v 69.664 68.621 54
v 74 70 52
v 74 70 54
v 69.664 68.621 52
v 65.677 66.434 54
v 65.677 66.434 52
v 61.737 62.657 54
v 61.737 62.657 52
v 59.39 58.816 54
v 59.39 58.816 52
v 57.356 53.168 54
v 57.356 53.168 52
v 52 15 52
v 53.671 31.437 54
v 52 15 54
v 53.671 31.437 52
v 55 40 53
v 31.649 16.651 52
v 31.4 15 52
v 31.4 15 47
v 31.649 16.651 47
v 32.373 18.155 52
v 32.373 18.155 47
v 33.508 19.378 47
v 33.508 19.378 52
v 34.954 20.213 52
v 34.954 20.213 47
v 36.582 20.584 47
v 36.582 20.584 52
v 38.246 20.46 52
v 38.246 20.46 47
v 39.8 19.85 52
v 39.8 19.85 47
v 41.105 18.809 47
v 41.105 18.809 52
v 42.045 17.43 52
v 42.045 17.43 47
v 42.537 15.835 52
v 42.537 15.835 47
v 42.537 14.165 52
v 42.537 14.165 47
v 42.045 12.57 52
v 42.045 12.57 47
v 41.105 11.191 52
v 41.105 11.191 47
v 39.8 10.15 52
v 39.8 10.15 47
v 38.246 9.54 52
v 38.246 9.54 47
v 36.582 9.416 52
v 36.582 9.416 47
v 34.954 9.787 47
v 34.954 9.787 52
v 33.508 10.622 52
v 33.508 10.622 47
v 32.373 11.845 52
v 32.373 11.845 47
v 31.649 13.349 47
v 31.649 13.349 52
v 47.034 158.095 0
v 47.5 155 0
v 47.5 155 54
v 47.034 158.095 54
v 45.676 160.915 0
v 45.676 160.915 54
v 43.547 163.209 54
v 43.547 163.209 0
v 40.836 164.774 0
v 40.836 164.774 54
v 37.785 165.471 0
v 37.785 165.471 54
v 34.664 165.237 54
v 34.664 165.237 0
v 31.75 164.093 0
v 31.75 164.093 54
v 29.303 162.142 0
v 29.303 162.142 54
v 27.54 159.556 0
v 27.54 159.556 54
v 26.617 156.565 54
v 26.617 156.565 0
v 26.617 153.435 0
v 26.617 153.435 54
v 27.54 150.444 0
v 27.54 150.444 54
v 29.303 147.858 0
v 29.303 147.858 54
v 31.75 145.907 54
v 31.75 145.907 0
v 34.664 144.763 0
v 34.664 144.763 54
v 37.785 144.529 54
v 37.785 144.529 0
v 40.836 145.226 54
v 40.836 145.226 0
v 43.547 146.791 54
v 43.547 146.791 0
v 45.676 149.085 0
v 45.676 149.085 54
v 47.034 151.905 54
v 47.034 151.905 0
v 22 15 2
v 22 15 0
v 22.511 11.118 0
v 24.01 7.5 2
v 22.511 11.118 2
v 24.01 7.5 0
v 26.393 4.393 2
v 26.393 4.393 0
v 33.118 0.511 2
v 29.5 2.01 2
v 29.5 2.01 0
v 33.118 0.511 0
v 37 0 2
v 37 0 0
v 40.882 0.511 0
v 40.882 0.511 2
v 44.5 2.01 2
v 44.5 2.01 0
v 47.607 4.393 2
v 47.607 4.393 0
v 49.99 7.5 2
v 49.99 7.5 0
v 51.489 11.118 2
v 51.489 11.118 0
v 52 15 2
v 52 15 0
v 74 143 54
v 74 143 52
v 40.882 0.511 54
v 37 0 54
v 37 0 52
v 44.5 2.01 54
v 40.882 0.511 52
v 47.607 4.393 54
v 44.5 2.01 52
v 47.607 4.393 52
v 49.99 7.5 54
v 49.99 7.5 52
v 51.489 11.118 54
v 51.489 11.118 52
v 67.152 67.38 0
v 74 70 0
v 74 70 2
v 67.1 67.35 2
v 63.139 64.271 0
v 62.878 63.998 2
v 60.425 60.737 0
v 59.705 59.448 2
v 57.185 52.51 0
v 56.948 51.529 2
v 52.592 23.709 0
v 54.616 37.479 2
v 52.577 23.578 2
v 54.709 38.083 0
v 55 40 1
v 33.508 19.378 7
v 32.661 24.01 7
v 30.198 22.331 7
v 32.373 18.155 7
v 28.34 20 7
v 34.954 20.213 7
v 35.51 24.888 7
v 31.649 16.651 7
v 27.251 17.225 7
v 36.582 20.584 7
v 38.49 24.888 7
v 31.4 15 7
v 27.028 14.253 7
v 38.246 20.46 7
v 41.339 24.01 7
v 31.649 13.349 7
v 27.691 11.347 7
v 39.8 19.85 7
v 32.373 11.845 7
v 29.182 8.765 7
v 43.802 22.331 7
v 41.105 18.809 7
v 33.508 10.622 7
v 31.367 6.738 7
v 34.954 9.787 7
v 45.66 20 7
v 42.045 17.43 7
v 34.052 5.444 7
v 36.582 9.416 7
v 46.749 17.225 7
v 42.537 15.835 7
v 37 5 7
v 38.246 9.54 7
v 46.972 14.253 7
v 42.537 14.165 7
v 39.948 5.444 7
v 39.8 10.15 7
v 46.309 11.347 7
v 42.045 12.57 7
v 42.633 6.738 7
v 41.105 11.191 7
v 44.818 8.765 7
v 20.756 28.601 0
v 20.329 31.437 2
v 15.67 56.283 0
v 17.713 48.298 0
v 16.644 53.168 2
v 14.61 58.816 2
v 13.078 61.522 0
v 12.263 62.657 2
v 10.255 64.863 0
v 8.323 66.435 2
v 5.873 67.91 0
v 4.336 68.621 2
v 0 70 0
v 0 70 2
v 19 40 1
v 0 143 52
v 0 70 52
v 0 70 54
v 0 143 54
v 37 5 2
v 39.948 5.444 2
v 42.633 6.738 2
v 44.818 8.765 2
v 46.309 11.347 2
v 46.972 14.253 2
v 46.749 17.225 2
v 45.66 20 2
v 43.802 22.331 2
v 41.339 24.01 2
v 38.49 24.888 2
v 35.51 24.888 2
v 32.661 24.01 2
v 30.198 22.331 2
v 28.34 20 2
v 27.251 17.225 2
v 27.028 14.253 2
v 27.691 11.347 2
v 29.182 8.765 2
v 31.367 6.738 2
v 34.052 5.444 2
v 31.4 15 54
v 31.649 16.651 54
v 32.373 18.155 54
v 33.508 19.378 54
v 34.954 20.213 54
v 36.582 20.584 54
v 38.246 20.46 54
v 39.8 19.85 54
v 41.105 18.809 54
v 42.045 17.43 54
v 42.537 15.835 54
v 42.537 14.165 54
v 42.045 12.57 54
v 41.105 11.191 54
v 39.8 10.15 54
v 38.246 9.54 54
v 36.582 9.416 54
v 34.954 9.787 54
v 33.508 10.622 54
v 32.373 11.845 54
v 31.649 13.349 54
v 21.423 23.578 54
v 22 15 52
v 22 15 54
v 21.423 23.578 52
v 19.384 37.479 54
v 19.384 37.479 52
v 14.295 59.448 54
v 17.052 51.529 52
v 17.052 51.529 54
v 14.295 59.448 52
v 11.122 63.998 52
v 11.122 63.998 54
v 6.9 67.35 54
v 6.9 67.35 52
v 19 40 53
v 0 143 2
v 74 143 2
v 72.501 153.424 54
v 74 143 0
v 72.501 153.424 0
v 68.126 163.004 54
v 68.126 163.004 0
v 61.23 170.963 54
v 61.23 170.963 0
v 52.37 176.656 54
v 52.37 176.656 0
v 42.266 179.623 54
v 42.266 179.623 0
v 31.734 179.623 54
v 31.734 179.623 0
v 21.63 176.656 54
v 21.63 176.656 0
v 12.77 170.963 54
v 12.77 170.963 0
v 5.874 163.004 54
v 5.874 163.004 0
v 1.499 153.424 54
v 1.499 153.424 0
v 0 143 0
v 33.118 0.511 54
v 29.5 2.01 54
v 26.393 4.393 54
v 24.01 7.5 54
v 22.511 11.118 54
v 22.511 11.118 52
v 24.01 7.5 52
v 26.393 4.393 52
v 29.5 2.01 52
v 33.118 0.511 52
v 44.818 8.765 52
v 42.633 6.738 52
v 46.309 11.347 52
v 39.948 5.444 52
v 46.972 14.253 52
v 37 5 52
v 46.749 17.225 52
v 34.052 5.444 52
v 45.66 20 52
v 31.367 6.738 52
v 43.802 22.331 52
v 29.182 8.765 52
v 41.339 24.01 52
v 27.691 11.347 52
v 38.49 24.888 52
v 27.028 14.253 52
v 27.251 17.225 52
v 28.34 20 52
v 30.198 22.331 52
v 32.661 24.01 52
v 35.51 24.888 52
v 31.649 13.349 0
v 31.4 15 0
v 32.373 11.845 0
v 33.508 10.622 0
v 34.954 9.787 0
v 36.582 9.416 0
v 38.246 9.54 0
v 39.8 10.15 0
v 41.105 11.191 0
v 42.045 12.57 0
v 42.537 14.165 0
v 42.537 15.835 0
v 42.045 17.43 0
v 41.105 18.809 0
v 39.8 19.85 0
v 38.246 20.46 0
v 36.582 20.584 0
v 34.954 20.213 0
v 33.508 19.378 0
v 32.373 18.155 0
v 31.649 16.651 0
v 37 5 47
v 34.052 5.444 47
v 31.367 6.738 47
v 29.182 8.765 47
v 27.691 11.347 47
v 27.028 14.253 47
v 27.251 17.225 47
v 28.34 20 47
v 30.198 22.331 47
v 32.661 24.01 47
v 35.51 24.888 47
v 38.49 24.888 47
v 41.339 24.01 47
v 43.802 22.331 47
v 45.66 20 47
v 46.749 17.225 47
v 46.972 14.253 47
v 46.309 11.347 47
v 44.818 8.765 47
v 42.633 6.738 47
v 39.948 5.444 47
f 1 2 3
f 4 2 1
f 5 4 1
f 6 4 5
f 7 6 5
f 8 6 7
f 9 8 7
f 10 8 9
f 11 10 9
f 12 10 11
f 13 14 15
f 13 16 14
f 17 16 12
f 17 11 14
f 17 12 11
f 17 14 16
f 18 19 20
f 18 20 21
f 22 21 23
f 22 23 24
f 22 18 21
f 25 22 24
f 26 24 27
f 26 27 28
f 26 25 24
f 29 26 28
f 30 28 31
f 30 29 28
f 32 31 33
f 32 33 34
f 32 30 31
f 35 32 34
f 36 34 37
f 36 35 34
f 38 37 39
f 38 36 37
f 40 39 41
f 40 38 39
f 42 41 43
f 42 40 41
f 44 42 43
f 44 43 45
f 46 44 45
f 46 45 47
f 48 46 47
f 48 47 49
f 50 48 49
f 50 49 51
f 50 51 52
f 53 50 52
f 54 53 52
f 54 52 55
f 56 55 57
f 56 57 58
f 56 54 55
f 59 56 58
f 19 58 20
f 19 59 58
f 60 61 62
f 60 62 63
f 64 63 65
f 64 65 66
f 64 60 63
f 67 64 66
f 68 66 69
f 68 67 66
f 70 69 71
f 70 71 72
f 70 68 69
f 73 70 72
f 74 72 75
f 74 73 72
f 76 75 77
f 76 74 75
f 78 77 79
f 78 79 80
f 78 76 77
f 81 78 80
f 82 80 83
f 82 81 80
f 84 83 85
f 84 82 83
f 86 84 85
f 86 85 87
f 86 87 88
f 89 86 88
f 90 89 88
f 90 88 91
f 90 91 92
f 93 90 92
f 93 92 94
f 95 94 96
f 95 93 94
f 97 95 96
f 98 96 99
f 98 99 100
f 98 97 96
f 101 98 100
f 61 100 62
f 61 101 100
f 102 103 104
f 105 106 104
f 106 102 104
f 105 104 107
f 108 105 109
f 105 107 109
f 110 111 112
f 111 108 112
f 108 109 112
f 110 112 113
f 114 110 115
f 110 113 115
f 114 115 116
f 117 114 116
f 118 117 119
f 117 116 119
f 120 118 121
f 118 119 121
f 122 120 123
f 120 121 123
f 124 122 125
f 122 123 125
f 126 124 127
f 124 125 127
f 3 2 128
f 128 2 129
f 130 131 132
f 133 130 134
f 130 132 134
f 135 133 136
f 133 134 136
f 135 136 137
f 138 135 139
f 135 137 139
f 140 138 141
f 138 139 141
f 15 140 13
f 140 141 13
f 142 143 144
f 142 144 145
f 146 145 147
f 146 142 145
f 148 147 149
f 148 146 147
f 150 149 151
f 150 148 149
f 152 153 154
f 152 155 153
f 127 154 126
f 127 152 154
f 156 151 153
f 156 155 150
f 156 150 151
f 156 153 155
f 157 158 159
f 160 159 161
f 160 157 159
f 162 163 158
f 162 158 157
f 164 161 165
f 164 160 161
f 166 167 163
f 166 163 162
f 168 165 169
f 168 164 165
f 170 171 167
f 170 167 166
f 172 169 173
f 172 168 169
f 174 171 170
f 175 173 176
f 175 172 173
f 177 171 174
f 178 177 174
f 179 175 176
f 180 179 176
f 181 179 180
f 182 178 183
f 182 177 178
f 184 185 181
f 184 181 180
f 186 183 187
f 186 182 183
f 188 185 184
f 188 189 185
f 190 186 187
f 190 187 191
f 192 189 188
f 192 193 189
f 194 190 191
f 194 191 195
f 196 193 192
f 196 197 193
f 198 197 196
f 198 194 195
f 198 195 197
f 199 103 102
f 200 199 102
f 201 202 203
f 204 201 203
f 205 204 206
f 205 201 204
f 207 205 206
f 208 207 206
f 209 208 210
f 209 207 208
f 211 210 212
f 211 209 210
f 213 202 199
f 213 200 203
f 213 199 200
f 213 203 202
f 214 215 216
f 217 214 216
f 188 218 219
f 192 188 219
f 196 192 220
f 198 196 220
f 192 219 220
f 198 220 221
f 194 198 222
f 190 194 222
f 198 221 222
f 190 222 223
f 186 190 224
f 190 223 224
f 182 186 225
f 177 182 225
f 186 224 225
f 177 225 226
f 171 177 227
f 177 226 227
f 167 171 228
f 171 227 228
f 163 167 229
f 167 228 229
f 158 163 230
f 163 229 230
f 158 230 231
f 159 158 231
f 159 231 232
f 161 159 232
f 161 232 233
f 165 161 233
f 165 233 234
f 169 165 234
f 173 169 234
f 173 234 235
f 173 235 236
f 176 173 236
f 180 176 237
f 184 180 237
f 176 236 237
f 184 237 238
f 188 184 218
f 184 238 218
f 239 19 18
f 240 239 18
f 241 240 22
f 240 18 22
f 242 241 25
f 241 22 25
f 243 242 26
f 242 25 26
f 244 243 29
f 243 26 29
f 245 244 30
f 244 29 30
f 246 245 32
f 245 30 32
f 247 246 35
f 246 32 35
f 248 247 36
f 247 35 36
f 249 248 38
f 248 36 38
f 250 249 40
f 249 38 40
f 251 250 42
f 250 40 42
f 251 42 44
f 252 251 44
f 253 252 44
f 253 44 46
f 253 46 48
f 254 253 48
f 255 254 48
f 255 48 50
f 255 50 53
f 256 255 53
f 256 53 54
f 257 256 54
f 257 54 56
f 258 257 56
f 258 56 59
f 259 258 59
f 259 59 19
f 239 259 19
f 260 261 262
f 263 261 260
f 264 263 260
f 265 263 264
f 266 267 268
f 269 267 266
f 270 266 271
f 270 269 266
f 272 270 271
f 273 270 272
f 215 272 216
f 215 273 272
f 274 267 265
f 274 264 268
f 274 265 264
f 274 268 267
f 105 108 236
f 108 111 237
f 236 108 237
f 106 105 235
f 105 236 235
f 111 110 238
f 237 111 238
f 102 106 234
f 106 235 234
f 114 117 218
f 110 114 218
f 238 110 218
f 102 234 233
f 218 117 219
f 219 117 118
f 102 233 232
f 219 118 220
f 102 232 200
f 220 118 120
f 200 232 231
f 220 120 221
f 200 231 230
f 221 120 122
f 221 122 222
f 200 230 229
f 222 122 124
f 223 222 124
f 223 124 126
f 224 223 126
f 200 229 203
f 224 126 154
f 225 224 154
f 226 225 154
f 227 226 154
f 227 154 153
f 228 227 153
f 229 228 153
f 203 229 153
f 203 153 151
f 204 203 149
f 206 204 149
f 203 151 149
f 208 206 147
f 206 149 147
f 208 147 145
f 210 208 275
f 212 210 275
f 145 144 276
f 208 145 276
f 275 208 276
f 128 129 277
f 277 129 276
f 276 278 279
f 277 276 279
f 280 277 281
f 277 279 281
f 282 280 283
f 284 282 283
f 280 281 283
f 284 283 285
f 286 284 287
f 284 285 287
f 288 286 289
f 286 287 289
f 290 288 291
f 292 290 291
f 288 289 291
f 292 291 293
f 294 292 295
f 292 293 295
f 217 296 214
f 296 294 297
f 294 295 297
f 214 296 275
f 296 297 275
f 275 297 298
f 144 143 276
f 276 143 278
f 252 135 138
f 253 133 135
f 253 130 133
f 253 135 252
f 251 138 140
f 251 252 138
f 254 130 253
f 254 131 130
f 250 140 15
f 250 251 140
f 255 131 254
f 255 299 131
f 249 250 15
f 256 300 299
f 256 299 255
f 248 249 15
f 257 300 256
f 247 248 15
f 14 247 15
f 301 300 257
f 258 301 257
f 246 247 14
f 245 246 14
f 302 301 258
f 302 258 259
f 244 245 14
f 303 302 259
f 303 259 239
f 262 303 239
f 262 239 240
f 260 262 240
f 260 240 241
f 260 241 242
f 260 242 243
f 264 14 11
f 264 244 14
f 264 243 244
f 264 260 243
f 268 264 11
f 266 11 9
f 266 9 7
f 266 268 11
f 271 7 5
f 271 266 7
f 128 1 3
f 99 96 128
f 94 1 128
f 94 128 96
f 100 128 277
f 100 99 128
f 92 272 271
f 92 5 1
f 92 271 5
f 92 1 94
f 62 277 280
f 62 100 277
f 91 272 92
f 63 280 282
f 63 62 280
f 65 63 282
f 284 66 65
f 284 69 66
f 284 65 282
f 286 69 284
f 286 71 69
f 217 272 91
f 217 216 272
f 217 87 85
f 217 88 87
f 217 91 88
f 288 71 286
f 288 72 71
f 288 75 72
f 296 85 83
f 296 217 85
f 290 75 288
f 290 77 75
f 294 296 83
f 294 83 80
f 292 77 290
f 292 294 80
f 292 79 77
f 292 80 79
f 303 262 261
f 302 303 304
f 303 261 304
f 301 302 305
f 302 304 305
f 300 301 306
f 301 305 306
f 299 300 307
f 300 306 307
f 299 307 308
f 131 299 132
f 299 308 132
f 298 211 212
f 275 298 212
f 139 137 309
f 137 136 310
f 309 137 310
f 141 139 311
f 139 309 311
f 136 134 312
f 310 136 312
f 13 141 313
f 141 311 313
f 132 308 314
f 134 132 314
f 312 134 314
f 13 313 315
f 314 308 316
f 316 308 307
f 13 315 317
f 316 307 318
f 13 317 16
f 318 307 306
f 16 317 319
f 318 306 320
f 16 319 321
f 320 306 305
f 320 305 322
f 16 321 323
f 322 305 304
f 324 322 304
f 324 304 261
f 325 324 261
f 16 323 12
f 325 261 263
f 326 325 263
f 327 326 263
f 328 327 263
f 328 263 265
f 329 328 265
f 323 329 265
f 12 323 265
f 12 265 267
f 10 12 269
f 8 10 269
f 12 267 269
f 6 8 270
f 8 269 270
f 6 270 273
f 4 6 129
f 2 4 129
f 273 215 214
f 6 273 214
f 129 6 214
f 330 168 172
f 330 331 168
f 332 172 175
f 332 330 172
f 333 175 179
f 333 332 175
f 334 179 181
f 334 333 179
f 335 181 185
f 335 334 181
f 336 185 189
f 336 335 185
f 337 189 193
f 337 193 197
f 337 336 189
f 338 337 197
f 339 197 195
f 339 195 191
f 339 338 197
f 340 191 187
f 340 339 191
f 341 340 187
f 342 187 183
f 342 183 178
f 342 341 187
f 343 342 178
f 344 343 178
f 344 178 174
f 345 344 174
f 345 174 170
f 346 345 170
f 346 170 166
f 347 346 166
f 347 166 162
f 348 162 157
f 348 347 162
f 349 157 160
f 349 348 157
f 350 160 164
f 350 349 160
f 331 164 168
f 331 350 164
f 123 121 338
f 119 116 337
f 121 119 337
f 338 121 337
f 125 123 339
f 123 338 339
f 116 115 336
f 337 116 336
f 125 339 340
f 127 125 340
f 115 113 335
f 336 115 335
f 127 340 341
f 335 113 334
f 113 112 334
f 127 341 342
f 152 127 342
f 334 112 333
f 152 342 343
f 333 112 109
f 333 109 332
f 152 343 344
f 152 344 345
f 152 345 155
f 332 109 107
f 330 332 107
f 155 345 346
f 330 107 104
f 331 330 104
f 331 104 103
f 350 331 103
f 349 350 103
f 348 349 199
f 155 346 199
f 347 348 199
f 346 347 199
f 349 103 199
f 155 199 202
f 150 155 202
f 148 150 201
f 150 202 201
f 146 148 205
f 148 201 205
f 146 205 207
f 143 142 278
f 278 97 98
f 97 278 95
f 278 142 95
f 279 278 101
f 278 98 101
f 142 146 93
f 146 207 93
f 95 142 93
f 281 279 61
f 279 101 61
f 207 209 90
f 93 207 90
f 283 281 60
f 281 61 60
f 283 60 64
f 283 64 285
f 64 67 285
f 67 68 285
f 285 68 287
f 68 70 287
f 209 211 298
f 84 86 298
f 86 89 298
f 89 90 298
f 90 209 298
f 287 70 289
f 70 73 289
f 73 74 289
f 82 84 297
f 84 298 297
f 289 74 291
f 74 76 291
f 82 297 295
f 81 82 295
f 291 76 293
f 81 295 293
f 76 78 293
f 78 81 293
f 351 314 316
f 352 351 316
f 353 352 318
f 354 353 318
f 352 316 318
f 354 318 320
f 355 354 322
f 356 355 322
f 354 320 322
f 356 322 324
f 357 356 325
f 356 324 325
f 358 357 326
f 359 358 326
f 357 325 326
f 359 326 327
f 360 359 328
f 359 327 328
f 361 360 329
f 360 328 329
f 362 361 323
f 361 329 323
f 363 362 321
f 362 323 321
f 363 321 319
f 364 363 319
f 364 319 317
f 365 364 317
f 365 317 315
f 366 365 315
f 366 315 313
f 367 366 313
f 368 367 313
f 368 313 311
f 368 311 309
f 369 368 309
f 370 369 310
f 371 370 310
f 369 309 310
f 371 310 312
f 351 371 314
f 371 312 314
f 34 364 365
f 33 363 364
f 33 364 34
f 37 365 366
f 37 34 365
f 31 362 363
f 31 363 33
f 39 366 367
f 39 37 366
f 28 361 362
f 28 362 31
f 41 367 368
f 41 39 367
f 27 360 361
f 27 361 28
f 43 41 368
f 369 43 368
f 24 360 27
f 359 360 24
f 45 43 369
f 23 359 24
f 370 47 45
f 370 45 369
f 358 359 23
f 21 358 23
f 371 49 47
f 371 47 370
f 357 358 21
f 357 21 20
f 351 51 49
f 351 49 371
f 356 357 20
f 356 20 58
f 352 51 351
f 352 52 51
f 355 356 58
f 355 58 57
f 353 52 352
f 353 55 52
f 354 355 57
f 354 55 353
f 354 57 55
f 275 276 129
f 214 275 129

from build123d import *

# Parameters (mm, degrees)
CROQUIS1_R              = 5.6
CROQUIS1_R_2            = 10.5
SALIENTE_EXTRUIR1_DEPTH = 54
CROQUIS6_W              = 54
CROQUIS6_H              = 70
SALIENTE_EXTRUIR3_DEPTH = 74
CORTAR_EXTRUIR13_DEPTH  = 74
CORTAR_EXTRUIR14_DEPTH  = 74
CROQUIS9_W              = 3
CROQUIS9_H              = 11.2
CORTAR_EXTRUIR15_DEPTH  = 74
CROQUIS10_R             = 5.6
CORTAR_EXTRUIR16_DEPTH  = 74
CROQUIS11_R             = 10
CROQUIS11_R_2           = 5.6
SALIENTE_EXTRUIR4_DEPTH = 5
CROQUIS12_R             = 10
CROQUIS12_R_2           = 5.6
SALIENTE_EXTRUIR5_DEPTH = 5
CROQUIS13_W             = 50
CROQUIS13_H             = 73
CORTAR_EXTRUIR17_DEPTH  = 74


with BuildPart() as part:
    # Croquis1 → Saliente-Extruir1 (new body)
    with BuildSketch(Plane.XY):
        with BuildLine():
            Line((0, 143), (0, 70))
            add(Edge.make_bspline(
                [(22, 15), (22, 22.317960933), (17.777719643, 44.524463784), (15.903513438, 66.300635574), (0, 70)],
                knots=[0, 0, 0, 0, 0.399675276, 1, 1, 1, 1], degree=3))
            ThreePointArc((22, 15), (37, 0), (52, 15))
            add(Edge.make_bspline(
                [(52, 15), (52, 22.317960933), (56.222280357, 44.524463784), (58.096486562, 66.300635574), (74, 70)],
                knots=[0, 0, 0, 0, 0.399675276, 1, 1, 1, 1], degree=3))
            Line((74, 70), (74, 143))
            ThreePointArc((74, 143), (37, 180), (0, 143))
        make_face()
        with Locations((37, 15)):
            Circle(CROQUIS1_R, mode=Mode.SUBTRACT)
        with Locations((37, 155)):
            Circle(CROQUIS1_R_2, mode=Mode.SUBTRACT)
    extrude(amount=SALIENTE_EXTRUIR1_DEPTH)

    # Croquis6 → Saliente-Extruir3 (add)
    with BuildSketch(Plane.ZY):
        with Locations((27, 35)):
            Rectangle(CROQUIS6_W, CROQUIS6_H)
    extrude(amount=-SALIENTE_EXTRUIR3_DEPTH)

    # Croquis7 → Cortar-Extruir13 (cut)
    with BuildSketch(Plane(origin=(74, 0, 0), x_dir=(0, 0, -1), z_dir=(1, 0, 0))):
        Polygon((-52, 0), (-2, 0), (-2, 9.4), (-5, 9.4), (-5, 20.6), (-2, 20.6), (-2, 70), (-52, 70), (-52, 20.6), (-49, 20.6), (-49, 9.4), (-52, 9.4), align=None)
    extrude(amount=-CORTAR_EXTRUIR13_DEPTH, mode=Mode.SUBTRACT)

    # Croquis8 → Cortar-Extruir14 (cut)
    with BuildSketch(Plane(origin=(0, 0, 0), x_dir=(-1, 0, 0), z_dir=(0, 0, -1))):
        with BuildLine():
            add(Edge.make_bspline(
                [(-74, 70), (-58.096486562, 66.300635574), (-56.222280357, 44.524463784), (-52, 22.317960933), (-52, 15)],
                knots=[0, 0, 0, 0, 0.600324724, 1, 1, 1, 1], degree=3))
            Line((-74, 70), (-74, 0))
            Line((-74, 0), (-37, 0))
            ThreePointArc((-37, 0), (-47.606601718, 4.393398282), (-52, 15))
        make_face()
        with BuildLine():
            ThreePointArc((-22, 15), (-26.393398282, 4.393398282), (-37, 0))
            Line((-37, 0), (0, 0))
            Line((0, 0), (0, 70))
            add(Edge.make_bspline(
                [(-22, 15), (-22, 22.317960933), (-17.777719643, 44.524463784), (-15.903513438, 66.300635574), (0, 70)],
                knots=[0, 0, 0, 0, 0.399675276, 1, 1, 1, 1], degree=3))
        make_face()
    extrude(amount=-CORTAR_EXTRUIR14_DEPTH, mode=Mode.SUBTRACT)

    # Croquis9 → Cortar-Extruir15 (cut)
    with BuildSketch(Plane(origin=(74, 0, 0), x_dir=(0, 0, -1), z_dir=(1, 0, 0))):
        with Locations((-50.5, 15)):
            Rectangle(CROQUIS9_W, CROQUIS9_H)
        Polygon((-2, 20.6), (-5.198845147, 20.6), (-5, 9.4), (-2, 9.4), align=None)
    extrude(amount=-CORTAR_EXTRUIR15_DEPTH, mode=Mode.SUBTRACT)

    # Croquis10 → Cortar-Extruir16 (cut)
    with BuildSketch(Plane(origin=(0, 0, 0), x_dir=(-1, 0, 0), z_dir=(0, 0, -1))):
        with Locations((-37, 15)):
            Circle(CROQUIS10_R)
    extrude(amount=-CORTAR_EXTRUIR16_DEPTH, mode=Mode.SUBTRACT)

    # Croquis11 → Saliente-Extruir4 (add)
    with BuildSketch(Plane(origin=(0, 0, 52), x_dir=(-1, 0, 0), z_dir=(0, 0, -1))):
        with Locations(Location((-37, 15, 0), (0, 0, 270))):
            Circle(CROQUIS11_R)
        with Locations((-37, 15)):
            Circle(CROQUIS11_R_2, mode=Mode.SUBTRACT)
    extrude(amount=SALIENTE_EXTRUIR4_DEPTH)

    # Croquis12 → Saliente-Extruir5 (add)
    with BuildSketch(Plane.XY.offset(2)):
        with Locations(Location((37, 15, 0), (0, 0, 270))):
            Circle(CROQUIS12_R)
        with Locations(Location((37, 15, 0), (0, 0, 180))):
            Circle(CROQUIS12_R_2, mode=Mode.SUBTRACT)
    extrude(amount=SALIENTE_EXTRUIR5_DEPTH)

    # Croquis13 → Cortar-Extruir17 (cut)
    with BuildSketch(Plane.ZY):
        with Locations((27, 106.5)):
            Rectangle(CROQUIS13_W, CROQUIS13_H)
    extrude(amount=-CORTAR_EXTRUIR17_DEPTH, mode=Mode.SUBTRACT)


solid = part.part
